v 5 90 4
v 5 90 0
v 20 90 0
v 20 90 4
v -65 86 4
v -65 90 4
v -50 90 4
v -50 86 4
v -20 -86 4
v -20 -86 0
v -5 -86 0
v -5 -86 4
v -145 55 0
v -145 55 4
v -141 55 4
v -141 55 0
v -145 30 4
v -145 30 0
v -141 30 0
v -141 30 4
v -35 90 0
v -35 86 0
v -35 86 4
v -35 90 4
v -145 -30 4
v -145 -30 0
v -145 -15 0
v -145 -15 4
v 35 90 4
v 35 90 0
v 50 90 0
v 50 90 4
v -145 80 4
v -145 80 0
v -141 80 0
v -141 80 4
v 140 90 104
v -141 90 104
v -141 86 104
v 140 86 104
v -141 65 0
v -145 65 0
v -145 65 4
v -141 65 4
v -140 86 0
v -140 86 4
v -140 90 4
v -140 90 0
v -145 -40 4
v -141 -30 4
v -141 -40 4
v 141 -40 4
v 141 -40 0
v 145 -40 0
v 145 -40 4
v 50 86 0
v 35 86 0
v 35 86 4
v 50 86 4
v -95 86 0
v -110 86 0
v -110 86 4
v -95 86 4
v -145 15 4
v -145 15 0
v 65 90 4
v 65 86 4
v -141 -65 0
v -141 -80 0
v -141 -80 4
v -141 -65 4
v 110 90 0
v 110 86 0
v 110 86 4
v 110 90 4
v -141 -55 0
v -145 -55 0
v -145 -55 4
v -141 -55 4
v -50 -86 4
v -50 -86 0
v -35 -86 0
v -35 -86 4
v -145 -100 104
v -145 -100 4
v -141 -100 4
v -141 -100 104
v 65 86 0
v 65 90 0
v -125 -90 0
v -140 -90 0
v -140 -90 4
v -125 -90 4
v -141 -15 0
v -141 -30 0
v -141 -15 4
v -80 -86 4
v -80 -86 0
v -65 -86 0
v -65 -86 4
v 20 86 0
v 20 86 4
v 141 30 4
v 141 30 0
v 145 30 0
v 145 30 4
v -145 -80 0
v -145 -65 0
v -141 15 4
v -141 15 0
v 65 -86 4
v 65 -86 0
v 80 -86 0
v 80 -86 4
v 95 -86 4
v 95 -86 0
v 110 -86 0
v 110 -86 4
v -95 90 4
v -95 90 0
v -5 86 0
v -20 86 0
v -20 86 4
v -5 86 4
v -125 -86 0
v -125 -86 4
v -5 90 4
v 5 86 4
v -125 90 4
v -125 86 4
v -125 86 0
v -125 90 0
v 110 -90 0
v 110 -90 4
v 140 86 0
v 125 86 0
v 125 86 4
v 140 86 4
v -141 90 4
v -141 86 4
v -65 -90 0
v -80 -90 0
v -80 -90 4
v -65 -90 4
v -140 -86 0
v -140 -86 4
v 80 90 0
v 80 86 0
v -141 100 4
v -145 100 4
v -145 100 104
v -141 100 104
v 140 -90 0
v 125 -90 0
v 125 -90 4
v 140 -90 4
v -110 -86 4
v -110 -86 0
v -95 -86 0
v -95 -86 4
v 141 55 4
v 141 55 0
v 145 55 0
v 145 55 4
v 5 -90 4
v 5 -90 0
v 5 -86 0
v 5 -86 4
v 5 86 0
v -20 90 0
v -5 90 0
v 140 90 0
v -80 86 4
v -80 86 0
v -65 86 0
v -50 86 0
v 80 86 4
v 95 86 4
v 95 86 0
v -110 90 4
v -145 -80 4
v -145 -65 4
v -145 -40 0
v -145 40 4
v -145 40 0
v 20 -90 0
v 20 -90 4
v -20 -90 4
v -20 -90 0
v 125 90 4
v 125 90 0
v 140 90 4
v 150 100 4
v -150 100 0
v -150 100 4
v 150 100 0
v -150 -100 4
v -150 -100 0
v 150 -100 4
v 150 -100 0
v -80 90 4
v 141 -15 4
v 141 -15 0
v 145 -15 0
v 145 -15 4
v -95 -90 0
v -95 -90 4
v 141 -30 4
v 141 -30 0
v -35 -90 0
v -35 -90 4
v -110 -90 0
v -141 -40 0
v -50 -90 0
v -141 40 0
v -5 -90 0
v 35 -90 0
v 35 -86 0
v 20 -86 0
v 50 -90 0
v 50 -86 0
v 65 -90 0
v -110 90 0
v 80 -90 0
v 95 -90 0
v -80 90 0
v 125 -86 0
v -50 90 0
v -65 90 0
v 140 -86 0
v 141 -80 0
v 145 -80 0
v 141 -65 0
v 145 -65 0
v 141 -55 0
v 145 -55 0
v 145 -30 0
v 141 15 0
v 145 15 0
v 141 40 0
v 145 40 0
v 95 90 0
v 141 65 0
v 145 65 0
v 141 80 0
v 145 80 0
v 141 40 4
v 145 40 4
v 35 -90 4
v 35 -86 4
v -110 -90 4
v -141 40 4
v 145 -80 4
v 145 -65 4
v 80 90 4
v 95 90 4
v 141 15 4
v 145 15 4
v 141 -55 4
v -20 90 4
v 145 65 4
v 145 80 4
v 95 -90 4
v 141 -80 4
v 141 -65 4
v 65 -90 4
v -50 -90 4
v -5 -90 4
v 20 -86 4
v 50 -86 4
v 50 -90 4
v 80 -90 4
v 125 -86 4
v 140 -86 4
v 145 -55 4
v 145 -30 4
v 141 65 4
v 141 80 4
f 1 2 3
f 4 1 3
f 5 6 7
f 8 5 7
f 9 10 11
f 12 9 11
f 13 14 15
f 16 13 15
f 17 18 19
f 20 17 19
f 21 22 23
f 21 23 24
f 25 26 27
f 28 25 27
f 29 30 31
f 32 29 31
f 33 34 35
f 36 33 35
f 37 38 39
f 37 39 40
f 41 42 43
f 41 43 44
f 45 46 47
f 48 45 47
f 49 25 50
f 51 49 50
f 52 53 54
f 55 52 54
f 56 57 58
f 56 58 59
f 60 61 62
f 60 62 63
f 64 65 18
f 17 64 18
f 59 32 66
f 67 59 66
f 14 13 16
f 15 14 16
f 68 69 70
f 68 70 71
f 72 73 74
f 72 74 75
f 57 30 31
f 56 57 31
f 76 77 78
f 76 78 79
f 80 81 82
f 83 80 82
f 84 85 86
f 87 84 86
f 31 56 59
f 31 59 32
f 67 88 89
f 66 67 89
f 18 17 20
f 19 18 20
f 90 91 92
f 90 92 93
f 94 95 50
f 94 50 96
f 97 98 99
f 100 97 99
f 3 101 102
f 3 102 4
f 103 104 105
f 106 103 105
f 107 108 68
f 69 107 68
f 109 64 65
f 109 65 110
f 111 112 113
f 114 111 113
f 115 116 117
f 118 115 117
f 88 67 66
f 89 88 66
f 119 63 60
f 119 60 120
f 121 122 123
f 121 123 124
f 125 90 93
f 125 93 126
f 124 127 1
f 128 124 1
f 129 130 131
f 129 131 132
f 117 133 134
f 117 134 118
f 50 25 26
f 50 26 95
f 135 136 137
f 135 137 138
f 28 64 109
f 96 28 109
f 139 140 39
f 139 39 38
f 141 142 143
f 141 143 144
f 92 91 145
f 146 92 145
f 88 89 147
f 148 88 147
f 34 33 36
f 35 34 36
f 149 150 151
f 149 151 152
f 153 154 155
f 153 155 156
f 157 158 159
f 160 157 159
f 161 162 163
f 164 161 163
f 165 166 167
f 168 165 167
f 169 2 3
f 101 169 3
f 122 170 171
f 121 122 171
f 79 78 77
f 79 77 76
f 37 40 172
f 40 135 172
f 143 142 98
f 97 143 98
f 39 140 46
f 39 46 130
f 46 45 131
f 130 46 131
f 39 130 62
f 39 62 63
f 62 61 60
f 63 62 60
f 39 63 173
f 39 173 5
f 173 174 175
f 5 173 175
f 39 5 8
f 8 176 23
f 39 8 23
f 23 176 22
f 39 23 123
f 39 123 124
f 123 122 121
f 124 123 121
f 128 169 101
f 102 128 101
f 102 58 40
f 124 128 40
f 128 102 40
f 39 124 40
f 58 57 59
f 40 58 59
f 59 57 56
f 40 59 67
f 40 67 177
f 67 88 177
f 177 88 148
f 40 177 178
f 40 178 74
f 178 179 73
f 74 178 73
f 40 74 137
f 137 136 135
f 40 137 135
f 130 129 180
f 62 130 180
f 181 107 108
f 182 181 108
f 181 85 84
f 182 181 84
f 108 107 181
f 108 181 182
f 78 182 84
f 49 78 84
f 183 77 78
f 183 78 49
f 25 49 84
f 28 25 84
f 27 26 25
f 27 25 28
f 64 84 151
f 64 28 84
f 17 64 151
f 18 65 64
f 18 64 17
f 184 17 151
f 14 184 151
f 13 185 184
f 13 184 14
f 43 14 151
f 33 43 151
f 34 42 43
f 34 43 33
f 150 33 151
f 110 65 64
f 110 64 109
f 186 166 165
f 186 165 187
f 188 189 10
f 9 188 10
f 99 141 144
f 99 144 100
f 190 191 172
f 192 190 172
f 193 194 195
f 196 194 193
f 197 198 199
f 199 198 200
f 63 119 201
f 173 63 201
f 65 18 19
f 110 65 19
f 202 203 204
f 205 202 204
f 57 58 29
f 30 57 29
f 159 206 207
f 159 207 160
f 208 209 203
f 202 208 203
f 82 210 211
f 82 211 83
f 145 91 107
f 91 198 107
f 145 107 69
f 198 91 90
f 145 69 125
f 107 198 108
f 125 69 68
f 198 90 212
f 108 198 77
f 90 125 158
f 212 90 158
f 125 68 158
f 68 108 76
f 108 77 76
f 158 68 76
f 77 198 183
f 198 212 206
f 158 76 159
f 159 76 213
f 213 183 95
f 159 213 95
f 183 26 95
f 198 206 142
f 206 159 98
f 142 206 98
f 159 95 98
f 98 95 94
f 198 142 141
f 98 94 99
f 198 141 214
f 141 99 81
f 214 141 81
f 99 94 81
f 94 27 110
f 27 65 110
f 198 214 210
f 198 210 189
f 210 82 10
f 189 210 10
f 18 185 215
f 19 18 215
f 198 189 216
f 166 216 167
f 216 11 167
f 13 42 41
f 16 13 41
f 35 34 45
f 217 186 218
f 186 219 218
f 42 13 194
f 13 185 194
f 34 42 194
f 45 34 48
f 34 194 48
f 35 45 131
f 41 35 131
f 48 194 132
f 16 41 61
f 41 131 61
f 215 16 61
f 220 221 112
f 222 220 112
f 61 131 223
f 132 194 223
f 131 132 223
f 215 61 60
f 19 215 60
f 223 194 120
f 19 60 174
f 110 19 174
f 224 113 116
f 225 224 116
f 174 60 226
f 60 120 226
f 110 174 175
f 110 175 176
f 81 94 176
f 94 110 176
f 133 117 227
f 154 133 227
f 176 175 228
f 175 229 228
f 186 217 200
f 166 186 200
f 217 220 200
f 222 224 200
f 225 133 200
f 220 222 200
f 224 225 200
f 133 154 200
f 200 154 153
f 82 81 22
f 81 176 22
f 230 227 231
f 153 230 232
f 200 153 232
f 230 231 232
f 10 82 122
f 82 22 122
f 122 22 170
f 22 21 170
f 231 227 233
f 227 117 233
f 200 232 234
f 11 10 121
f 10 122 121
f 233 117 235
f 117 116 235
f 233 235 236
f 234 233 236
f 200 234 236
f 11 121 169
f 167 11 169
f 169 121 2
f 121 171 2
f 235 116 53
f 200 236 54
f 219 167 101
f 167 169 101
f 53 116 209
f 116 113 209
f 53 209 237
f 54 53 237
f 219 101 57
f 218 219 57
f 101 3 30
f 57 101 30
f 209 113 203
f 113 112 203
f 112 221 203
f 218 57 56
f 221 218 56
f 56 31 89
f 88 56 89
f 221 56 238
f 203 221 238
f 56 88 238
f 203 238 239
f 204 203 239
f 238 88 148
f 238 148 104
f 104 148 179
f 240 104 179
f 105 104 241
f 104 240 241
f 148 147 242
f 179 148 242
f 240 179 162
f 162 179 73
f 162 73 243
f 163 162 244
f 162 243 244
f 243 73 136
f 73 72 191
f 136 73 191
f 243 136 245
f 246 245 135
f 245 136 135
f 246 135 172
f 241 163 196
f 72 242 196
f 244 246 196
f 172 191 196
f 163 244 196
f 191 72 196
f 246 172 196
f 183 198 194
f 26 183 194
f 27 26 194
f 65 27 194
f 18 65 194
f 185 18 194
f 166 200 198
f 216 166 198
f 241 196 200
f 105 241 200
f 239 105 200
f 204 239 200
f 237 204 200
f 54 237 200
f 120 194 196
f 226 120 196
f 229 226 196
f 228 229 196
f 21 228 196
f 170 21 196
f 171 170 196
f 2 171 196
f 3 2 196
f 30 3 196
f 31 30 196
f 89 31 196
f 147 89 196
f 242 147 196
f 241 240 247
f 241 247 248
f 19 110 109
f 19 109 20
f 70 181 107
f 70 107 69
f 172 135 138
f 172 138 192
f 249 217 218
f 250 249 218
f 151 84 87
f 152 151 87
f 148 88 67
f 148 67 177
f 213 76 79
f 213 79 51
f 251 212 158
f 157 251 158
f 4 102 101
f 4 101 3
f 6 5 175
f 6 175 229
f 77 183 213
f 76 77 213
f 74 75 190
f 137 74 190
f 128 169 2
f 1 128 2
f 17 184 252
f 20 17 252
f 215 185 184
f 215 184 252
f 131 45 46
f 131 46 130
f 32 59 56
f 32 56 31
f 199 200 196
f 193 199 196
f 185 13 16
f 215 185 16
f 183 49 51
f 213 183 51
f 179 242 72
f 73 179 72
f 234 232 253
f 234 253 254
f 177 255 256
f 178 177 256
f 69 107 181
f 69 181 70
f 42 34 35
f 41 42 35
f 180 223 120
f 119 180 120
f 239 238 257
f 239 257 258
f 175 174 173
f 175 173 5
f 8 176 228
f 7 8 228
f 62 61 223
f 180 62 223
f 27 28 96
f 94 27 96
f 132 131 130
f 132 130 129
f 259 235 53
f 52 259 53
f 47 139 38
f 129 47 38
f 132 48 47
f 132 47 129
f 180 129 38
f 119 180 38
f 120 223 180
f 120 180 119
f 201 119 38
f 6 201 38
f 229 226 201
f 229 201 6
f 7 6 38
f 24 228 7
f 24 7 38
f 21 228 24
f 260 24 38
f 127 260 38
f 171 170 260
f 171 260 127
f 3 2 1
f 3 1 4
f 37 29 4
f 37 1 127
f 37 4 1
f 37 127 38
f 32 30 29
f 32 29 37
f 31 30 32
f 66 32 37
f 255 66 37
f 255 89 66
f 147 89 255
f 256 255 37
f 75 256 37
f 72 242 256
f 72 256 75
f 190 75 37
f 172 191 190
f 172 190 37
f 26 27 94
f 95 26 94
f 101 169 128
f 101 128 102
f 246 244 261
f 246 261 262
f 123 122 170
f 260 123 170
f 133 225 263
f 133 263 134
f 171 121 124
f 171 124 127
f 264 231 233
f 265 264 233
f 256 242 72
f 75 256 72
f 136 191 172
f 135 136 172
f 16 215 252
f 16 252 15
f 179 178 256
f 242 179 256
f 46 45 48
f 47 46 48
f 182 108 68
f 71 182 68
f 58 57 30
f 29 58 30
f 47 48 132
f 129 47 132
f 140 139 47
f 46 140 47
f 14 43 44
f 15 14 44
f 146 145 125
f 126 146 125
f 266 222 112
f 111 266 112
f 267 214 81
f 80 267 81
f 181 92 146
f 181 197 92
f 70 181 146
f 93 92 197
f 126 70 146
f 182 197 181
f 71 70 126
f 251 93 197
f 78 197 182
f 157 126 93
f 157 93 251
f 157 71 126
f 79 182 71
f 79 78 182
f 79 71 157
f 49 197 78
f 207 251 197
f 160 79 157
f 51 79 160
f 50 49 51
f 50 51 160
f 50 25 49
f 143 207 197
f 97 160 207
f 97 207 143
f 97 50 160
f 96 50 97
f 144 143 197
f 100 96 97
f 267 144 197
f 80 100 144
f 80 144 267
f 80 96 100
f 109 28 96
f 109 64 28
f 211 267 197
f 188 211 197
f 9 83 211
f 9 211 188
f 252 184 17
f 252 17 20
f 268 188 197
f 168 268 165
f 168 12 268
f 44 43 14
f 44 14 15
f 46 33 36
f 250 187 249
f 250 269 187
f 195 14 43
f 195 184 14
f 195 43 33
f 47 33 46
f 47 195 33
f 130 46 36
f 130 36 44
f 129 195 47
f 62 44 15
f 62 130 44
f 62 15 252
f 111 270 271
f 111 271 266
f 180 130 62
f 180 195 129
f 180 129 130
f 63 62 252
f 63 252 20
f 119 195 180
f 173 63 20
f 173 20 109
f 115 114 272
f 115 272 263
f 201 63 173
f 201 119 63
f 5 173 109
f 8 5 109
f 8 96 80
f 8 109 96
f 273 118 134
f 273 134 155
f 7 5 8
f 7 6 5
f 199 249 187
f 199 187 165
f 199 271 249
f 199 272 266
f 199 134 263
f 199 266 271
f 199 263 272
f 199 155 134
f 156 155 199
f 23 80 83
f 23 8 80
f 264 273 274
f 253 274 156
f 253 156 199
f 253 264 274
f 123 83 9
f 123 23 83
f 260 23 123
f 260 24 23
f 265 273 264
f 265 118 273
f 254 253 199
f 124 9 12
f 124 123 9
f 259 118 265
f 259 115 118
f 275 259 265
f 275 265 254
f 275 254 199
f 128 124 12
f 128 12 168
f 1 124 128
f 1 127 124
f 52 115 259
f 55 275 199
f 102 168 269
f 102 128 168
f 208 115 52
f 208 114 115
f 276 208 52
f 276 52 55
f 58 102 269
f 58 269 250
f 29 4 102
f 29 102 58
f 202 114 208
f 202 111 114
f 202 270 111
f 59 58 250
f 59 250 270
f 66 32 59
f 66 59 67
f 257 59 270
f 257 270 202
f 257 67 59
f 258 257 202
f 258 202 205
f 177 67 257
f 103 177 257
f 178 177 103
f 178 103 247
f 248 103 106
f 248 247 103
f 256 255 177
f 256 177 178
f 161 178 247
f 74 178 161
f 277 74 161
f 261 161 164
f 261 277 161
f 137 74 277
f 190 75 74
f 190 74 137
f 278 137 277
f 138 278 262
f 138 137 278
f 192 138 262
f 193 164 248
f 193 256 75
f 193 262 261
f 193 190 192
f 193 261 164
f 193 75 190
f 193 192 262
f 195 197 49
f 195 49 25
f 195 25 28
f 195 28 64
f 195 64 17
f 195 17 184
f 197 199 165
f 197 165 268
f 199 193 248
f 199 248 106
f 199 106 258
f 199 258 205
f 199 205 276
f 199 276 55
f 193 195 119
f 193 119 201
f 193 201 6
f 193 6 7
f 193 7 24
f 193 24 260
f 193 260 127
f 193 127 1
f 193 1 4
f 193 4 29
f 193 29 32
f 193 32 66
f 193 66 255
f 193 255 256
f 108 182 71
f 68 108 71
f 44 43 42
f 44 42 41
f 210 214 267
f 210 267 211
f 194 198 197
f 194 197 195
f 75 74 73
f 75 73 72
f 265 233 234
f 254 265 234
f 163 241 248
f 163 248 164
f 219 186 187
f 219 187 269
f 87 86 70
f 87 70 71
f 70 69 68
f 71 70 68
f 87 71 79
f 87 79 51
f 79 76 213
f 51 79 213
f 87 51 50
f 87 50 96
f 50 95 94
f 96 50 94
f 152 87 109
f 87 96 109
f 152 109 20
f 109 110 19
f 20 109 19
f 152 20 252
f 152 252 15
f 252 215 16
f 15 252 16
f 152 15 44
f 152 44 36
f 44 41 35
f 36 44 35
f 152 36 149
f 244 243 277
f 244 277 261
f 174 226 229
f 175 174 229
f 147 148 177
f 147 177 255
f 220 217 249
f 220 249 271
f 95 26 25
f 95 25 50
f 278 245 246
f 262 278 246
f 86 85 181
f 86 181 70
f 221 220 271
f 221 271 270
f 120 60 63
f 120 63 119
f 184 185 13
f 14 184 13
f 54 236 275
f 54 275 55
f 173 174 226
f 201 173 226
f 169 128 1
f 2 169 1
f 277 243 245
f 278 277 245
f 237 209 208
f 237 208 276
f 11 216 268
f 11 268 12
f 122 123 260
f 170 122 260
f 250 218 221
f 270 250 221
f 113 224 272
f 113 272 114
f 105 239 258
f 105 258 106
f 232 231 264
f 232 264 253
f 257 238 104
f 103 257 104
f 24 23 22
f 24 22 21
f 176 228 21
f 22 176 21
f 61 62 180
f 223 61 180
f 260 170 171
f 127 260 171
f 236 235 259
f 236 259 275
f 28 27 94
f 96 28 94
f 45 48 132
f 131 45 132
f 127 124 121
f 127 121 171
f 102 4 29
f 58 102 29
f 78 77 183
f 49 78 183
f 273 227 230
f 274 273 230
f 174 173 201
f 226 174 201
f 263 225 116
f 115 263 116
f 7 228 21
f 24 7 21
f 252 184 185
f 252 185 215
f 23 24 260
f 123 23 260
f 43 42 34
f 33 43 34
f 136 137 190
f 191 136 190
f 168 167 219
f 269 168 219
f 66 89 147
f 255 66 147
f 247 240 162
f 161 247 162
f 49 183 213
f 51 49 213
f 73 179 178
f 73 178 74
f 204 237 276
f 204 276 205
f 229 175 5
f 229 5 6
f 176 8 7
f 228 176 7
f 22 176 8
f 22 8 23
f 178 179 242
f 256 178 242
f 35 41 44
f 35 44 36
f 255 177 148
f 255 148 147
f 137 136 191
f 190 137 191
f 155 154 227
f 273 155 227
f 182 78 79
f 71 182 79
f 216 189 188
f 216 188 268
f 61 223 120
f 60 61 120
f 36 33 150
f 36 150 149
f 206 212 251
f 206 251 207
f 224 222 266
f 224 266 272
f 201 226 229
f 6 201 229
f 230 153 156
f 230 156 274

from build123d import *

# Parameters (mm, degrees)
F1_W      = 300
F1_H      = 200
F1_W_2    = 15
F1_H_2    = 4
F1_W_3    = 4
F1_H_3    = 15
F2_DEPTH  = 4
F3_W      = 4
F3_H      = 15
F4_DEPTH  = 4
F5_W      = 4
F5_H      = 200
F6_DEPTH  = 100
F8_W      = 15
F8_H      = 4
F9_DEPTH  = 4
F10_W     = 281
F10_H     = 4
F11_DEPTH = 100


with BuildPart() as f2:
    # F1 (on Top) → F2 (new body)
    with BuildSketch(Plane.XY):
        Rectangle(F1_W, F1_H)
        with Locations((-132.5, -88)):
            Rectangle(F1_W_2, F1_H_2, mode=Mode.SUBTRACT)
        with Locations((-102.5, -88)):
            Rectangle(F1_W_2, F1_H_2, mode=Mode.SUBTRACT)
        with Locations((-143, -72.5)):
            Rectangle(F1_W_3, F1_H_3, mode=Mode.SUBTRACT)
        with Locations((-72.5, -88)):
            Rectangle(F1_W_2, F1_H_2, mode=Mode.SUBTRACT)
        with Locations((-42.5, -88)):
            Rectangle(F1_W_2, F1_H_2, mode=Mode.SUBTRACT)
        with Locations((-12.5, -88)):
            Rectangle(F1_W_2, F1_H_2, mode=Mode.SUBTRACT)
        with Locations((-143, -47.5)):
            Rectangle(F1_W_3, F1_H_3, mode=Mode.SUBTRACT)
        with Locations((-143, -22.5)):
            Rectangle(F1_W_3, F1_H_3, mode=Mode.SUBTRACT)
        with Locations((12.5, -88)):
            Rectangle(F1_W_2, F1_H_2, mode=Mode.SUBTRACT)
        with Locations((42.5, -88)):
            Rectangle(F1_W_2, F1_H_2, mode=Mode.SUBTRACT)
        with Locations((72.5, -88)):
            Rectangle(F1_W_2, F1_H_2, mode=Mode.SUBTRACT)
        with Locations((102.5, -88)):
            Rectangle(F1_W_2, F1_H_2, mode=Mode.SUBTRACT)
        with Locations((132.5, -88)):
            Rectangle(F1_W_2, F1_H_2, mode=Mode.SUBTRACT)
        with Locations((143, -72.5)):
            Rectangle(F1_W_3, F1_H_3, mode=Mode.SUBTRACT)
        with Locations((143, -47.5)):
            Rectangle(F1_W_3, F1_H_3, mode=Mode.SUBTRACT)
        with Locations((143, -22.5)):
            Rectangle(F1_W_3, F1_H_3, mode=Mode.SUBTRACT)
        with Locations((-143, 22.5)):
            Rectangle(F1_W_3, F1_H_3, mode=Mode.SUBTRACT)
        with Locations((-143, 47.5)):
            Rectangle(F1_W_3, F1_H_3, mode=Mode.SUBTRACT)
        with Locations((-143, 72.5)):
            Rectangle(F1_W_3, F1_H_3, mode=Mode.SUBTRACT)
        with Locations((-132.5, 88)):
            Rectangle(F1_W_2, F1_H_2, mode=Mode.SUBTRACT)
        with Locations((-102.5, 88)):
            Rectangle(F1_W_2, F1_H_2, mode=Mode.SUBTRACT)
        with Locations((-72.5, 88)):
            Rectangle(F1_W_2, F1_H_2, mode=Mode.SUBTRACT)
        with Locations((-42.5, 88)):
            Rectangle(F1_W_2, F1_H_2, mode=Mode.SUBTRACT)
        with Locations((-12.5, 88)):
            Rectangle(F1_W_2, F1_H_2, mode=Mode.SUBTRACT)
        with Locations((143, 22.5)):
            Rectangle(F1_W_3, F1_H_3, mode=Mode.SUBTRACT)
        with Locations((143, 47.5)):
            Rectangle(F1_W_3, F1_H_3, mode=Mode.SUBTRACT)
        with Locations((12.5, 88)):
            Rectangle(F1_W_2, F1_H_2, mode=Mode.SUBTRACT)
        with Locations((42.5, 88)):
            Rectangle(F1_W_2, F1_H_2, mode=Mode.SUBTRACT)
        with Locations((72.5, 88)):
            Rectangle(F1_W_2, F1_H_2, mode=Mode.SUBTRACT)
        with Locations((143, 72.5)):
            Rectangle(F1_W_3, F1_H_3, mode=Mode.SUBTRACT)
        with Locations((102.5, 88)):
            Rectangle(F1_W_2, F1_H_2, mode=Mode.SUBTRACT)
        with Locations((132.5, 88)):
            Rectangle(F1_W_2, F1_H_2, mode=Mode.SUBTRACT)
    extrude(amount=F2_DEPTH)


with BuildPart() as f4:
    # F3 (on face) → F4 (new body)
    with BuildSketch(Plane.XY.offset(4)):
        with Locations((-143, -72.5)):
            Rectangle(F3_W, F3_H)
    extrude(amount=-F4_DEPTH)



with BuildPart() as f4b:
    # F3 (on face) → F4, piece 2 (new body)
    with BuildSketch(Plane.XY.offset(4)):
        with Locations((-143, -47.5)):
            Rectangle(F3_W, F3_H)
    extrude(amount=-F4_DEPTH)


with BuildPart() as f4c:
    # F3 (on face) → F4, piece 3 (new body)
    with BuildSketch(Plane.XY.offset(4)):
        with Locations((-143, -22.5)):
            Rectangle(F3_W, F3_H)
    extrude(amount=-F4_DEPTH)


with BuildPart() as f4d:
    # F3 (on face) → F4, piece 4 (new body)
    with BuildSketch(Plane.XY.offset(4)):
        with Locations((-143, 22.5)):
            Rectangle(F3_W, F3_H)
    extrude(amount=-F4_DEPTH)


with BuildPart() as f4e:
    # F3 (on face) → F4, piece 5 (new body)
    with BuildSketch(Plane.XY.offset(4)):
        with Locations((-143, 47.5)):
            Rectangle(F3_W, F3_H)
    extrude(amount=-F4_DEPTH)


with BuildPart() as f4f:
    # F3 (on face) → F4, piece 6 (new body)
    with BuildSketch(Plane.XY.offset(4)):
        with Locations((-143, 72.5)):
            Rectangle(F3_W, F3_H)
    extrude(amount=-F4_DEPTH)


with BuildPart() as f4_1:
    add(f4.part)

    add(f4b.part)  # F6 merges F4b

    add(f4c.part)  # F6 merges F4c

    add(f4d.part)  # F6 merges F4d

    add(f4e.part)  # F6 merges F4e

    add(f4f.part)  # F6 merges F4f
    # F5 (on face) → F6 (join)
    with BuildSketch(Plane.XY.offset(4)):
        with Locations((-143, 0)):
            Rectangle(F5_W, F5_H)
    extrude(amount=F6_DEPTH)

    # F7: union 


with BuildPart() as f9:
    # F8 (on face) → F9 (new body)
    with BuildSketch(Plane.XY.offset(4)):
        with Locations((-132.5, 88)):
            Rectangle(F8_W, F8_H)
    extrude(amount=-F9_DEPTH)



with BuildPart() as f9b:
    # F8 (on face) → F9, piece 2 (new body)
    with BuildSketch(Plane.XY.offset(4)):
        with Locations((-102.5, 88)):
            Rectangle(F8_W, F8_H)
    extrude(amount=-F9_DEPTH)


with BuildPart() as f9c:
    # F8 (on face) → F9, piece 3 (new body)
    with BuildSketch(Plane.XY.offset(4)):
        with Locations((-72.5, 88)):
            Rectangle(F8_W, F8_H)
    extrude(amount=-F9_DEPTH)


with BuildPart() as f9d:
    # F8 (on face) → F9, piece 4 (new body)
    with BuildSketch(Plane.XY.offset(4)):
        with Locations((-42.5, 88)):
            Rectangle(F8_W, F8_H)
    extrude(amount=-F9_DEPTH)


with BuildPart() as f9e:
    # F8 (on face) → F9, piece 5 (new body)
    with BuildSketch(Plane.XY.offset(4)):
        with Locations((-12.5, 88)):
            Rectangle(F8_W, F8_H)
    extrude(amount=-F9_DEPTH)


with BuildPart() as f9f:
    # F8 (on face) → F9, piece 6 (new body)
    with BuildSketch(Plane.XY.offset(4)):
        with Locations((12.5, 88)):
            Rectangle(F8_W, F8_H)
    extrude(amount=-F9_DEPTH)


with BuildPart() as f9g:
    # F8 (on face) → F9, piece 7 (new body)
    with BuildSketch(Plane.XY.offset(4)):
        with Locations((42.5, 88)):
            Rectangle(F8_W, F8_H)
    extrude(amount=-F9_DEPTH)


with BuildPart() as f9h:
    # F8 (on face) → F9, piece 8 (new body)
    with BuildSketch(Plane.XY.offset(4)):
        with Locations((72.5, 88)):
            Rectangle(F8_W, F8_H)
    extrude(amount=-F9_DEPTH)


with BuildPart() as f9i:
    # F8 (on face) → F9, piece 9 (new body)
    with BuildSketch(Plane.XY.offset(4)):
        with Locations((102.5, 88)):
            Rectangle(F8_W, F8_H)
    extrude(amount=-F9_DEPTH)


with BuildPart() as f9j:
    # F8 (on face) → F9, piece 10 (new body)
    with BuildSketch(Plane.XY.offset(4)):
        with Locations((132.5, 88)):
            Rectangle(F8_W, F8_H)
    extrude(amount=-F9_DEPTH)


with BuildPart() as f9_1:
    add(f9.part)

    add(f9b.part)  # F11 merges F9b

    add(f9c.part)  # F11 merges F9c

    add(f9d.part)  # F11 merges F9d

    add(f9e.part)  # F11 merges F9e

    add(f9f.part)  # F11 merges F9f

    add(f9g.part)  # F11 merges F9g

    add(f9h.part)  # F11 merges F9h

    add(f9i.part)  # F11 merges F9i

    add(f9j.part)  # F11 merges F9j
    # F10 (on face) → F11 (join)
    with BuildSketch(Plane.XY.offset(4)):
        with Locations((-0.5, 88)):
            Rectangle(F10_W, F10_H)
    extrude(amount=F11_DEPTH)


solid = Compound([f2.part, f4_1.part, f9_1.part])
